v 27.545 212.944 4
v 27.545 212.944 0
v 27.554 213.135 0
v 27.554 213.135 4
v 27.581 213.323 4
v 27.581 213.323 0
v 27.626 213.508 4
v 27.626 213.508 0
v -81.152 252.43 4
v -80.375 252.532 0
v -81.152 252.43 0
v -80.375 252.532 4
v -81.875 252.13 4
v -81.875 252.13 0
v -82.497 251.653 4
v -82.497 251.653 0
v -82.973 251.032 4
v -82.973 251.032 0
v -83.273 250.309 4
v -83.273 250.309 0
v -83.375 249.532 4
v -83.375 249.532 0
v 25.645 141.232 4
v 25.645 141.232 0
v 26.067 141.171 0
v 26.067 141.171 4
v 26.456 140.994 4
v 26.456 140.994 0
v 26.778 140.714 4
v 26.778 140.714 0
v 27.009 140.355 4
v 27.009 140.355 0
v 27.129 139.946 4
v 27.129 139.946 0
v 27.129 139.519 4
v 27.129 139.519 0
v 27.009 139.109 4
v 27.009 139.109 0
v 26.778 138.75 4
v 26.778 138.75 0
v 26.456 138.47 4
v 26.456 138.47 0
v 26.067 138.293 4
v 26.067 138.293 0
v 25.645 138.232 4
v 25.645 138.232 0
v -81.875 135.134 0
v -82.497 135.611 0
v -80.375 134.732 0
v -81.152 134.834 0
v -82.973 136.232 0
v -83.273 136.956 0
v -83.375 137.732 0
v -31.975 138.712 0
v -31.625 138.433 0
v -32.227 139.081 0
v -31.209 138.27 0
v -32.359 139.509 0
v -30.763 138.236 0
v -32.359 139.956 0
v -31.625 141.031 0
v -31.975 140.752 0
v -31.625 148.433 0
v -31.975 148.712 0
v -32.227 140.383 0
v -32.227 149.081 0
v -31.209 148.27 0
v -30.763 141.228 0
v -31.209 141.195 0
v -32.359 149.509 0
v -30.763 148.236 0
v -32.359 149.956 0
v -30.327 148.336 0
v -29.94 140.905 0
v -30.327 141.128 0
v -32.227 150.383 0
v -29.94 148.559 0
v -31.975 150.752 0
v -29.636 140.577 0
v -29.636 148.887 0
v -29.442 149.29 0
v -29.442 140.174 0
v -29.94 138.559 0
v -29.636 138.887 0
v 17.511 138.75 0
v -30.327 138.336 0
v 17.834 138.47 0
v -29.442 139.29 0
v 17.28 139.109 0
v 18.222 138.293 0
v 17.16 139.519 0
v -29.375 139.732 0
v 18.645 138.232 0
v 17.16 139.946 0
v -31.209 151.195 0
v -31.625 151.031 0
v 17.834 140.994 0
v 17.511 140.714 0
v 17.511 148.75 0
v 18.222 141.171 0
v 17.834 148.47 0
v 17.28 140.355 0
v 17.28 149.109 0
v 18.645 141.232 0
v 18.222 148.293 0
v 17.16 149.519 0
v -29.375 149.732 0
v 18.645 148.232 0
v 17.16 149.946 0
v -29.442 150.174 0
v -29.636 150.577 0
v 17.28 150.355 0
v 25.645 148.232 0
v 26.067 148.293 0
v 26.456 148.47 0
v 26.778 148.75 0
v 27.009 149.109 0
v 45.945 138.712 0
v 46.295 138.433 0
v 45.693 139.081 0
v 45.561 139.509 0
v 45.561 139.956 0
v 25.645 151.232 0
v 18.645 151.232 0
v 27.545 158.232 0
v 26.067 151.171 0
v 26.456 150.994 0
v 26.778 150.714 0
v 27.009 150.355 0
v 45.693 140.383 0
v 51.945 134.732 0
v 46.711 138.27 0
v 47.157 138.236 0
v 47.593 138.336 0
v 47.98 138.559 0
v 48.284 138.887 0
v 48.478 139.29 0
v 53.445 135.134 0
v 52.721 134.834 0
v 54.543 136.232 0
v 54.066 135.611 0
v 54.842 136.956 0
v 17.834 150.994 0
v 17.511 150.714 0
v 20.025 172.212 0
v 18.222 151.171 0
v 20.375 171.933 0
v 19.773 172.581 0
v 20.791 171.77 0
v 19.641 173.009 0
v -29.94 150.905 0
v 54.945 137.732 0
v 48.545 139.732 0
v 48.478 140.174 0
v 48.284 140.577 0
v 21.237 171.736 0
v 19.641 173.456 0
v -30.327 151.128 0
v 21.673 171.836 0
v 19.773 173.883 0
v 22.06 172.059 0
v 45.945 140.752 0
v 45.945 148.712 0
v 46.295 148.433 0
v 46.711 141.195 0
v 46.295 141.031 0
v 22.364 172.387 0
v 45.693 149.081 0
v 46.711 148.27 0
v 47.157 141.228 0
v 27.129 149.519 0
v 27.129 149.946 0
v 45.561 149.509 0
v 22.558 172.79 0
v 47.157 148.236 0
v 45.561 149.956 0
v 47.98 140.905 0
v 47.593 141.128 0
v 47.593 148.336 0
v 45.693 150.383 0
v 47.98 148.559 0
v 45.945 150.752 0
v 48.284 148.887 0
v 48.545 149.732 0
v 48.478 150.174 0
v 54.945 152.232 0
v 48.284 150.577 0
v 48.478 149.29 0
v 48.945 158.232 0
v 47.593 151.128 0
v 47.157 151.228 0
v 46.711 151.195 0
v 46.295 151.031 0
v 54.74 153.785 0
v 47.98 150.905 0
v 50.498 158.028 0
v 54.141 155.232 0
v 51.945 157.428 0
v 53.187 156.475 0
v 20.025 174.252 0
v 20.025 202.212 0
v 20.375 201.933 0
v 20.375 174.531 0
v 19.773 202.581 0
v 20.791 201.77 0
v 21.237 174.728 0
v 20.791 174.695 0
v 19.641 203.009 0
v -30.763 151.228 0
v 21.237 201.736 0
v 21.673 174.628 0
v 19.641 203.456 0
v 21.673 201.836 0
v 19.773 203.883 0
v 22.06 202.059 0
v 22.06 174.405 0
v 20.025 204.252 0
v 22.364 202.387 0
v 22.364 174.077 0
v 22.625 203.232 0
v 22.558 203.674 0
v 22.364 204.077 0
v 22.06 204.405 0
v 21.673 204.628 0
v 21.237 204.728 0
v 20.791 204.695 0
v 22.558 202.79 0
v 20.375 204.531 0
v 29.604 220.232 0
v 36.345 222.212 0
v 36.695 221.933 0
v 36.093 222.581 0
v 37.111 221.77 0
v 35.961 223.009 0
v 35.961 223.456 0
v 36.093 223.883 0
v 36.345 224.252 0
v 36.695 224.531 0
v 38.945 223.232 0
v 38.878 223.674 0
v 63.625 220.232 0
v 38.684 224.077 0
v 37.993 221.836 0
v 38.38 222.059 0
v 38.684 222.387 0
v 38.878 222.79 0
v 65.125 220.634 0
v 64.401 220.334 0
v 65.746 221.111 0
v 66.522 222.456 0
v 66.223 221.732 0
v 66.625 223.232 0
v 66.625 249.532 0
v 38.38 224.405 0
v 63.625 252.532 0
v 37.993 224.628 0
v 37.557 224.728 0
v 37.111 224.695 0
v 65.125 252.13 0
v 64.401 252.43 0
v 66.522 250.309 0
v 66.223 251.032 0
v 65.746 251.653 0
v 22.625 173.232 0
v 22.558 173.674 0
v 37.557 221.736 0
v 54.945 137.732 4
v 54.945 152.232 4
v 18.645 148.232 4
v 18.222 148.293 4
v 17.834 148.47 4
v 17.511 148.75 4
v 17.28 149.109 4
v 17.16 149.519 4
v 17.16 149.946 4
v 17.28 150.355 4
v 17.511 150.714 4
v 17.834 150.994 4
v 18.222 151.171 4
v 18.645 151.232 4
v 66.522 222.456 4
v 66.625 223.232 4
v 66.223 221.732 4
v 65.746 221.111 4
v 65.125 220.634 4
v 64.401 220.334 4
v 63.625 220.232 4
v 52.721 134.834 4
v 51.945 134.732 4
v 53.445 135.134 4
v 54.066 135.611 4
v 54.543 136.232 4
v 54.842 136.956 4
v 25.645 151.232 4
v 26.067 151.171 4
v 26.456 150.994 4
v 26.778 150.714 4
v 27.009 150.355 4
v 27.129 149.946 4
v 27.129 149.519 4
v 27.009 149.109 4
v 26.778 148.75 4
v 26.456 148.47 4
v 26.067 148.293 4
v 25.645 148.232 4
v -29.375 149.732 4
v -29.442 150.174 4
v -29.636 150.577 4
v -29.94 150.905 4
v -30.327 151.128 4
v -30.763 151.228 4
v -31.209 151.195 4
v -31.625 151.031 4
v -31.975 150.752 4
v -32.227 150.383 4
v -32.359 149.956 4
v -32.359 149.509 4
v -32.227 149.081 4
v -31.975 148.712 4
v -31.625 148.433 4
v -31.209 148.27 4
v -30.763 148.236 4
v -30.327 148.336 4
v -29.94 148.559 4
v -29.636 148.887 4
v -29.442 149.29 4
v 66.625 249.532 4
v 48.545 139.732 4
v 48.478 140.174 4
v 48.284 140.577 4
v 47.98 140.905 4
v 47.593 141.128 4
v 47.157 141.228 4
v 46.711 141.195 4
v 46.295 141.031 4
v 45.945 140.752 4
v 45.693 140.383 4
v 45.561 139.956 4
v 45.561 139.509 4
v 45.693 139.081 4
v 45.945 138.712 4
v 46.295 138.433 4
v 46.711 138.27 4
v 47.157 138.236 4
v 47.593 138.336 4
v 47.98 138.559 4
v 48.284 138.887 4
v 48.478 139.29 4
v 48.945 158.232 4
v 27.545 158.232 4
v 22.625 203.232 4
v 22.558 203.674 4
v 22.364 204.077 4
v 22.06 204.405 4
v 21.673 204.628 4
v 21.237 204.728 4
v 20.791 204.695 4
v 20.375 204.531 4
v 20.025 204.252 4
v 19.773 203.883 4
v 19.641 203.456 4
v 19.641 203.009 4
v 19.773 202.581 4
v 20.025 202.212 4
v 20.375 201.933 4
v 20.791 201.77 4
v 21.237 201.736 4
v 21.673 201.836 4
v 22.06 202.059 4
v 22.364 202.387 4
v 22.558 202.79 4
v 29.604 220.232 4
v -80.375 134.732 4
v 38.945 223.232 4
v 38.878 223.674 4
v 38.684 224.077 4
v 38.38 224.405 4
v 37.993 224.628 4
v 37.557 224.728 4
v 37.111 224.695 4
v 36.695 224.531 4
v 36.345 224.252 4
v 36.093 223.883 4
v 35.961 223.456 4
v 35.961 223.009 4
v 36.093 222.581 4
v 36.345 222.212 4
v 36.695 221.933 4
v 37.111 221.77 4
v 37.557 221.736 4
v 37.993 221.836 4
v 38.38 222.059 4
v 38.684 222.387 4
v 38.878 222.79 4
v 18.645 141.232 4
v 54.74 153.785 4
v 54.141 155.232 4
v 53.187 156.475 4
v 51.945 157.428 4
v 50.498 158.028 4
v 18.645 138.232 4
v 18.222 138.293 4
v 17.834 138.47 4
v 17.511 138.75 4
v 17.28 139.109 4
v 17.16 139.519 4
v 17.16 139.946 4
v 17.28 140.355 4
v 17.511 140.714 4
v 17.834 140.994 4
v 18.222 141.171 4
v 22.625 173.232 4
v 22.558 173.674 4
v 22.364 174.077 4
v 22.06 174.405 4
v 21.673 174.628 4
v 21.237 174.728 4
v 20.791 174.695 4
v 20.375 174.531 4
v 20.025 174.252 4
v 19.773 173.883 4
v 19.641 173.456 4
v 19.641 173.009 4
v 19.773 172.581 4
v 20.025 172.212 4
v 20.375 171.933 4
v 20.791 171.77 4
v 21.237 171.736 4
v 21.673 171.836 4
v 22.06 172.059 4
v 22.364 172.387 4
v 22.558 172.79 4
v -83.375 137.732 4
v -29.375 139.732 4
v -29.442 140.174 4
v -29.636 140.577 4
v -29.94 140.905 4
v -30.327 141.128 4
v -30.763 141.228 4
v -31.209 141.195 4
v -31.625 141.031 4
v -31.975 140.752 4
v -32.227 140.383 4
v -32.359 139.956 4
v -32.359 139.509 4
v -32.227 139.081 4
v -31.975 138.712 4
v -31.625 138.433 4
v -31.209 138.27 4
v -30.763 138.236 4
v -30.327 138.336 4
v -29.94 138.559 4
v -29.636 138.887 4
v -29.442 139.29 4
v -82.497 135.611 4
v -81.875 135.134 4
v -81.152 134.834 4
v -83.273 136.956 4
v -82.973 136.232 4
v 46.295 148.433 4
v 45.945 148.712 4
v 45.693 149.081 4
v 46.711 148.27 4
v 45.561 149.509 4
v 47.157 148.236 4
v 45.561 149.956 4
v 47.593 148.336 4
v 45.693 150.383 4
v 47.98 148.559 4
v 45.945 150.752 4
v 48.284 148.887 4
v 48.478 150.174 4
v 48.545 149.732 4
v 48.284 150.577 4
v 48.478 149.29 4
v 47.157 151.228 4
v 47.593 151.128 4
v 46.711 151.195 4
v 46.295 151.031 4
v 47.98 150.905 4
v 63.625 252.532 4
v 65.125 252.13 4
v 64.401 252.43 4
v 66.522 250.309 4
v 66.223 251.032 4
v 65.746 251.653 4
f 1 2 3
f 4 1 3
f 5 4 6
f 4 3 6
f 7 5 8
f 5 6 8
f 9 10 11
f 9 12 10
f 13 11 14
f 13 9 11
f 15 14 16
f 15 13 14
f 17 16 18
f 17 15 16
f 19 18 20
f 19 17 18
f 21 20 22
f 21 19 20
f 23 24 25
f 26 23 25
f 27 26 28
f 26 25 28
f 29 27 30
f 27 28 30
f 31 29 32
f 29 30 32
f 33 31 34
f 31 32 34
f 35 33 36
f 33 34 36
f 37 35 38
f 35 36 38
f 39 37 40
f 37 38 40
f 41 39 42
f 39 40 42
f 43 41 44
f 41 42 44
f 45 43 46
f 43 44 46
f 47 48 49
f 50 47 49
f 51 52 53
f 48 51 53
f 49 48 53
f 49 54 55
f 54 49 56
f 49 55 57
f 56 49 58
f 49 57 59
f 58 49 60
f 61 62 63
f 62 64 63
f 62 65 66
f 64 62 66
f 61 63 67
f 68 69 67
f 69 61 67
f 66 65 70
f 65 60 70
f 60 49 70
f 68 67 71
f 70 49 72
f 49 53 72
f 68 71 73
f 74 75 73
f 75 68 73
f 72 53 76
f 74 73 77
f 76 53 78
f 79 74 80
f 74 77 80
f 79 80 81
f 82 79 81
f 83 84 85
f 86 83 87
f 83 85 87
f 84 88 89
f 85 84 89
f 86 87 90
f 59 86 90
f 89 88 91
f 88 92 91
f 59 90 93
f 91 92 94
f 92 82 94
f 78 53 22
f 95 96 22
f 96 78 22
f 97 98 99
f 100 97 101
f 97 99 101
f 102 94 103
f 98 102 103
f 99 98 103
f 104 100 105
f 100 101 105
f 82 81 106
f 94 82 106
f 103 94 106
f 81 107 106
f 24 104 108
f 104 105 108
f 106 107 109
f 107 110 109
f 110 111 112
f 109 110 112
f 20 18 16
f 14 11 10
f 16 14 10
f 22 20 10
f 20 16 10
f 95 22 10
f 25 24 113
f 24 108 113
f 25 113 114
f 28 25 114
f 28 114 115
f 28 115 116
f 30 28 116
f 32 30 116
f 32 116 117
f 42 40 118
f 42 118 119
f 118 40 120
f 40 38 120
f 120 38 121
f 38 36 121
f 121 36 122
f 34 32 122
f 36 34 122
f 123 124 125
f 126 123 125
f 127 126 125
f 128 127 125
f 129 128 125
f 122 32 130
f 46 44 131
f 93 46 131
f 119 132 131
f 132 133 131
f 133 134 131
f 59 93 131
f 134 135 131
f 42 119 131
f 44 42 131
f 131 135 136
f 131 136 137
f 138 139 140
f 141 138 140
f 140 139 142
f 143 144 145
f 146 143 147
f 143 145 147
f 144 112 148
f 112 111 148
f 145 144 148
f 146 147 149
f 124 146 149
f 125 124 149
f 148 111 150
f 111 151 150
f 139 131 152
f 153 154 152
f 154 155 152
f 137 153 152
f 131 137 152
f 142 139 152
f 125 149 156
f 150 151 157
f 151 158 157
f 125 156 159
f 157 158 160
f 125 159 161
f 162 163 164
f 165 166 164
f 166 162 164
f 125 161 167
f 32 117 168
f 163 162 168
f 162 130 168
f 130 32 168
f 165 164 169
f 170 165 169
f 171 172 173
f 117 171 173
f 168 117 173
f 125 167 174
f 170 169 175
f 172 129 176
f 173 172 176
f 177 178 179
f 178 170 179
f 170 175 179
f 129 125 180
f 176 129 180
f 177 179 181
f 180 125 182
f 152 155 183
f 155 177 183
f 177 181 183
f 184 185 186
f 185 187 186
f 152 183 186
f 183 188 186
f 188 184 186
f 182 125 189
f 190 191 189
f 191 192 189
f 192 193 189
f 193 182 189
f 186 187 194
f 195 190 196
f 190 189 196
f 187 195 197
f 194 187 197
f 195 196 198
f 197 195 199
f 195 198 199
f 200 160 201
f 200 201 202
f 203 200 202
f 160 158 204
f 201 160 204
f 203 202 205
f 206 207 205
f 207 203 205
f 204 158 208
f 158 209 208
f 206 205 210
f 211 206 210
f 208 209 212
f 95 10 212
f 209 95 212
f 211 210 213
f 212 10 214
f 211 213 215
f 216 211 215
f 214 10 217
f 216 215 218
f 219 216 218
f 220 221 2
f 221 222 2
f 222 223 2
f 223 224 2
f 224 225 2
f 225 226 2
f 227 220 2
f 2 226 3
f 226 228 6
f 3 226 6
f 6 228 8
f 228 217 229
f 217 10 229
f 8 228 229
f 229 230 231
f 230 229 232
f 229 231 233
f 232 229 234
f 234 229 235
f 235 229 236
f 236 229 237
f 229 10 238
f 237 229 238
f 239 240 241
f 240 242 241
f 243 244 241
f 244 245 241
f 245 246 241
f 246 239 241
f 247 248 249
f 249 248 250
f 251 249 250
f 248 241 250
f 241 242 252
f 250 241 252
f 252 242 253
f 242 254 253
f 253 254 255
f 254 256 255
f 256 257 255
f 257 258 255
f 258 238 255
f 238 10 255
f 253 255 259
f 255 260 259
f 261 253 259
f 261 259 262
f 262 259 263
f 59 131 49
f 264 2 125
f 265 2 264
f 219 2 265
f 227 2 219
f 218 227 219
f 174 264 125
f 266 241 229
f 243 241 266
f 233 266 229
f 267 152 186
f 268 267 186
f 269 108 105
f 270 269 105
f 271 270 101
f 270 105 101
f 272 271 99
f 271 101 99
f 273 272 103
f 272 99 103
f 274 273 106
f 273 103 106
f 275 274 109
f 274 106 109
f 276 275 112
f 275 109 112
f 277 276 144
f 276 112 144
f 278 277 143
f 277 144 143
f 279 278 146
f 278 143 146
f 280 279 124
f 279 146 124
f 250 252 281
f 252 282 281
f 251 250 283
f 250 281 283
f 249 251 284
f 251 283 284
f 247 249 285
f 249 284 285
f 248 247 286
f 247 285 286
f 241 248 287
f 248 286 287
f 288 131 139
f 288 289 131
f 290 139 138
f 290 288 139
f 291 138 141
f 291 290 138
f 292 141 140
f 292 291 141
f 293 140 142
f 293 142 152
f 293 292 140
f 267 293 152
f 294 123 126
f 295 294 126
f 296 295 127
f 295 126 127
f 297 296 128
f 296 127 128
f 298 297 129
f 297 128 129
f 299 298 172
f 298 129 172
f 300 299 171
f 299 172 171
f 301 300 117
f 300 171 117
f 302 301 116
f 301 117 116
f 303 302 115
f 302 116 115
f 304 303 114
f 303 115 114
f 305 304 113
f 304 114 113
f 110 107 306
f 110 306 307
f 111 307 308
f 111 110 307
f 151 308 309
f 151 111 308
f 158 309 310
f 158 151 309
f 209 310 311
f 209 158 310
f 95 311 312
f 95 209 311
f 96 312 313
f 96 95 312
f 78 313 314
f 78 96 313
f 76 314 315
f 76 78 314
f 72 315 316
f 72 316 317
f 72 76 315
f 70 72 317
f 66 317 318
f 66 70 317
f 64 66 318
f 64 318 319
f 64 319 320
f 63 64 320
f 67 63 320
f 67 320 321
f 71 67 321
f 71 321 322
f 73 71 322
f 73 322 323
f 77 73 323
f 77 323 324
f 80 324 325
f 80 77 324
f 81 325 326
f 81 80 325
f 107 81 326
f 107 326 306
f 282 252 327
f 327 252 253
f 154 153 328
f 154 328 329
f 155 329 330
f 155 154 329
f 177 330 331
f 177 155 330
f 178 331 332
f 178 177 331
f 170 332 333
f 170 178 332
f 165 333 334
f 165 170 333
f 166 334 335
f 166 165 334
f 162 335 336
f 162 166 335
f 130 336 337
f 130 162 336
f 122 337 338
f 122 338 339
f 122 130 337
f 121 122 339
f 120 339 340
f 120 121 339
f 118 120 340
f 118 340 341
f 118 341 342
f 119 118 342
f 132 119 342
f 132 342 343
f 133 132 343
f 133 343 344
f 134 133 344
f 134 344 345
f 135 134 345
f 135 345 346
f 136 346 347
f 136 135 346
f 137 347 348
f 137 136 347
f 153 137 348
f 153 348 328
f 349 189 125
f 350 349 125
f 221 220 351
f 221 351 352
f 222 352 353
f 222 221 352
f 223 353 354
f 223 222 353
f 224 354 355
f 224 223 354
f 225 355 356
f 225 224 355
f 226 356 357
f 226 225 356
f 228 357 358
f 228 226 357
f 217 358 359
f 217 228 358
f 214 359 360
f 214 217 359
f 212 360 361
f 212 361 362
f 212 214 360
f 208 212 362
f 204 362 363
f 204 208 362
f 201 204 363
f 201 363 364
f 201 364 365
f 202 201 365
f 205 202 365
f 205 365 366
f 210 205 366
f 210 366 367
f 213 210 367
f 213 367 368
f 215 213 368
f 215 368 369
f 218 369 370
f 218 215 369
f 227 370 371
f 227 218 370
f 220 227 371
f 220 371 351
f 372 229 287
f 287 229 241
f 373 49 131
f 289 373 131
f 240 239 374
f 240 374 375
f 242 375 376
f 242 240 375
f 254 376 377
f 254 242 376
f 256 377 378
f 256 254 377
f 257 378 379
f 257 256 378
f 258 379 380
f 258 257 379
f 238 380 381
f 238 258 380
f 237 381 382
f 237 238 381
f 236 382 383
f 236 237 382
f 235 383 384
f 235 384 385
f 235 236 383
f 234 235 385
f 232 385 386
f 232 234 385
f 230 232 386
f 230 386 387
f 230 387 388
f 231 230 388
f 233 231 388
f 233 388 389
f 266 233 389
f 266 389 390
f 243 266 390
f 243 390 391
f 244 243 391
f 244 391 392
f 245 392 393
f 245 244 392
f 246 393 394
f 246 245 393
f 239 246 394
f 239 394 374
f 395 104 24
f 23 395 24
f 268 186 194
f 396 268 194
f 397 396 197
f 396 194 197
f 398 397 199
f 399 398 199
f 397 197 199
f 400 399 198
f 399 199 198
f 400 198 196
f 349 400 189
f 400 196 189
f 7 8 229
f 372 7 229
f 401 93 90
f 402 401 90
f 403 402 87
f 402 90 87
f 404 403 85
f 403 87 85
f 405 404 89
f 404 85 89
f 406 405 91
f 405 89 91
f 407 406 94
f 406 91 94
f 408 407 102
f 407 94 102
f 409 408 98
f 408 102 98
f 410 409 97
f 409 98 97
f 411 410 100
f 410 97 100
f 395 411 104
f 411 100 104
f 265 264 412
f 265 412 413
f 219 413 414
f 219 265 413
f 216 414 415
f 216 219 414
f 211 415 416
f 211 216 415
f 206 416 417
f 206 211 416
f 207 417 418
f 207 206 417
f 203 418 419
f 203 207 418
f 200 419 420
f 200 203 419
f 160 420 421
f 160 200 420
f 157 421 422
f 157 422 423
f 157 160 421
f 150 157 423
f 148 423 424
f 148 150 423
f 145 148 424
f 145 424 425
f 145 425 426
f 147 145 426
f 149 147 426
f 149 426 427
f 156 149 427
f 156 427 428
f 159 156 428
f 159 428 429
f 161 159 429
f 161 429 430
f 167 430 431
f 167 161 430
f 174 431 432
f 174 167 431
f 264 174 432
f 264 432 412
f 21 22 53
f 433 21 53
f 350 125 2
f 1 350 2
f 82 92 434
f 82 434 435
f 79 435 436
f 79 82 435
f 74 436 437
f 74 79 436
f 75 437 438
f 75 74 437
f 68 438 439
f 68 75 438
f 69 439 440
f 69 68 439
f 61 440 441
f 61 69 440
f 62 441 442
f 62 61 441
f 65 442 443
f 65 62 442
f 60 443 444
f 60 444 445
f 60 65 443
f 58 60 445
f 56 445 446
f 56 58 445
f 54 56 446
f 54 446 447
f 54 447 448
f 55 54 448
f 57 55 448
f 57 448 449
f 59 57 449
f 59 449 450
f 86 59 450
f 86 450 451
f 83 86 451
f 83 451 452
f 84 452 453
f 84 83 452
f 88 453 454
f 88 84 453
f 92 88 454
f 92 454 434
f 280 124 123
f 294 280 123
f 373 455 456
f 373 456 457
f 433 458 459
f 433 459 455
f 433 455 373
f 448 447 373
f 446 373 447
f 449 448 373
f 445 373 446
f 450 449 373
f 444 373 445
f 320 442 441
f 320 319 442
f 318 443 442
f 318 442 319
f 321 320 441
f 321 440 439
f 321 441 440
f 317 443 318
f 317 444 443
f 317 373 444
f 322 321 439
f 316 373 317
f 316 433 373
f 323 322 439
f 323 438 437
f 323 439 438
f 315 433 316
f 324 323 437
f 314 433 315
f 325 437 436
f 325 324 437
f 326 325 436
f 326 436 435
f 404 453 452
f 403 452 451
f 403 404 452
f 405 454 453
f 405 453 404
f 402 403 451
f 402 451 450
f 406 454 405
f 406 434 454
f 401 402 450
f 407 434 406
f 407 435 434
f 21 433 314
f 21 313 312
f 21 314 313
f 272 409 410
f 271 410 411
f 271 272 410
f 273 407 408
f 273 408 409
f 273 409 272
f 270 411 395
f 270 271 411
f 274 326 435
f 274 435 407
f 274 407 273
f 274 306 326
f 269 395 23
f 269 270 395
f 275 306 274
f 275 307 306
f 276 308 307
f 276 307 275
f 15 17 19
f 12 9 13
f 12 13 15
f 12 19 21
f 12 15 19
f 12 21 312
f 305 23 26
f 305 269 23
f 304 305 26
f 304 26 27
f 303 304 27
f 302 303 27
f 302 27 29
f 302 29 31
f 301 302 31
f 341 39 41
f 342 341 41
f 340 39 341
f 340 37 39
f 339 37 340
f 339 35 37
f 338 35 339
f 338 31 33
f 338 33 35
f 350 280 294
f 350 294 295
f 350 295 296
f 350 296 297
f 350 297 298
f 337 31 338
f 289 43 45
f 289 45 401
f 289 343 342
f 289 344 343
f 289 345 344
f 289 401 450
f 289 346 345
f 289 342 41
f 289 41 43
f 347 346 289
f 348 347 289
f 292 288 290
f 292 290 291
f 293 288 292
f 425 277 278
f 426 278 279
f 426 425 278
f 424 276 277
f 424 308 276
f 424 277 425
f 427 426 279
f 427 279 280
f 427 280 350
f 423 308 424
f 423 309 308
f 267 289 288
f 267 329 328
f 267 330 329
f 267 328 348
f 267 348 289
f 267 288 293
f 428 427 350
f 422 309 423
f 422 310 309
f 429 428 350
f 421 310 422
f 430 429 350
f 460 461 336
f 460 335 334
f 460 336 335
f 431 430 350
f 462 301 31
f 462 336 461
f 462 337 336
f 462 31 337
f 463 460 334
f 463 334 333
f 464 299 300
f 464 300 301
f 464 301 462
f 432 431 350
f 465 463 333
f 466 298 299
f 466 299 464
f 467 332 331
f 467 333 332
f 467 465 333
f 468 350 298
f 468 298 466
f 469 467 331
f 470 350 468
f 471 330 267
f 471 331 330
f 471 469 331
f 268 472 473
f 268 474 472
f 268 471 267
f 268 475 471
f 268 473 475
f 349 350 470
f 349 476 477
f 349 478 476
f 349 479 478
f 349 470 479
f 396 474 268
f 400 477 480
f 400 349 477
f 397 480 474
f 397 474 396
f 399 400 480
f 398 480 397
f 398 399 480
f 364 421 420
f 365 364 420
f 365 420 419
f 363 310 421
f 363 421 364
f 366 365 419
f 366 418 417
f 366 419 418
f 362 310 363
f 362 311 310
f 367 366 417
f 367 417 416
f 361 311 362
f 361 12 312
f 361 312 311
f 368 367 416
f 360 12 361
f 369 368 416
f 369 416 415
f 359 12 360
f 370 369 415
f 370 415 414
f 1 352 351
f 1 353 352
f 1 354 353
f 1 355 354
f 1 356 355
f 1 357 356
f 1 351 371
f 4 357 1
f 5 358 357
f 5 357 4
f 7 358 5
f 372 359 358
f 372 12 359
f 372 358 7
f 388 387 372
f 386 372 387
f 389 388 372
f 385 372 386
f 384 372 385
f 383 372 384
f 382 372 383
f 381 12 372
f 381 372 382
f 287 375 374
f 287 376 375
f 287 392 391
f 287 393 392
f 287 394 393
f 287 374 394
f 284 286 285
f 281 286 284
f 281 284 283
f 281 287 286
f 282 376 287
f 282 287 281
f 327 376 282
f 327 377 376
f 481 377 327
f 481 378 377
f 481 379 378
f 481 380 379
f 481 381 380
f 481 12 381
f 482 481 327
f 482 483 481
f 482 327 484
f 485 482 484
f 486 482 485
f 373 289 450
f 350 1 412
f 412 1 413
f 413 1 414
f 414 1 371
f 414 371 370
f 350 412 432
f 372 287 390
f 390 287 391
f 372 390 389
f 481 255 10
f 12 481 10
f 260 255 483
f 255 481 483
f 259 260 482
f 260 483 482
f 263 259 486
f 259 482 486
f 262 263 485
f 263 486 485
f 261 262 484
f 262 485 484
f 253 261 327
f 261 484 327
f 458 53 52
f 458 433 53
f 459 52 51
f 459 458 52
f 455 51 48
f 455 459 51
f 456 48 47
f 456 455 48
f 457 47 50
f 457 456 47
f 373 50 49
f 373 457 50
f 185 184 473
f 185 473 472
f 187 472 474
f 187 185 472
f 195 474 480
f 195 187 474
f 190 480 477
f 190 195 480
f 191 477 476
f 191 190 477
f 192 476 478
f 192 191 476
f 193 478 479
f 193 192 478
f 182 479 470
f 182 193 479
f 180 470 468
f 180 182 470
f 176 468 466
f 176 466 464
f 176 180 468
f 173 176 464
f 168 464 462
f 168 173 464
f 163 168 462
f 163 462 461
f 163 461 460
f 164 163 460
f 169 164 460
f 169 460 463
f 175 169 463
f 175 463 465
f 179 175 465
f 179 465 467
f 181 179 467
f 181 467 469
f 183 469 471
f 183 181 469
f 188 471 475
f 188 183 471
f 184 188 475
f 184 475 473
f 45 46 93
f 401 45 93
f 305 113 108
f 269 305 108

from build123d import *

# Parameters (mm, degrees)
SKETCH_2_R      = 1.5
EXTRUDE_3_DEPTH = 4
FILLET_2_R      = 3


with BuildPart() as part:
    # 草图2 → 凸台-拉伸3 (new body)
    with BuildSketch(Plane.XY):
        with BuildLine():
            Line((66.624685503, 252.532138716), (-83.375314497, 252.532138716))
            Line((-83.375314497, 252.532138716), (-83.375314497, 134.732138716))
            Line((-83.375314497, 134.732138716), (54.944685503, 134.732138716))
            Line((54.944685503, 134.732138716), (54.944685503, 152.232138716))
            ThreePointArc((54.944685503, 152.232138716), (53.18732619, 156.474779403), (48.944685503, 158.232138716))
            Line((48.944685503, 158.232138716), (27.544685503, 158.232138716))
            Line((27.544685503, 158.232138716), (27.544685503, 212.944120657))
            ThreePointArc((27.544685503, 212.944120657), (27.565107012, 213.229197834), (27.6259545, 213.508453305))
            Line((27.6259545, 213.508453305), (29.603509033, 220.232138716))
            Line((29.603509033, 220.232138716), (66.624685503, 220.232138716))
            Line((66.624685503, 220.232138716), (66.624685503, 252.532138716))
        make_face()
        with Locations((-30.875314497, 139.732138716)):
            Circle(SKETCH_2_R, mode=Mode.SUBTRACT)
        with Locations((-30.875314497, 149.732138716)):
            Circle(SKETCH_2_R, mode=Mode.SUBTRACT)
        with Locations((21.124685503, 173.232138716)):
            Circle(SKETCH_2_R, mode=Mode.SUBTRACT)
        with Locations((21.124685503, 203.232138716)):
            Circle(SKETCH_2_R, mode=Mode.SUBTRACT)
        with BuildLine():
            Line((18.644685503, 151.232138716), (25.644685503, 151.232138716))
            ThreePointArc((25.644685503, 151.232138716), (27.144685503, 149.732138716), (25.644685503, 148.232138716))
            Line((25.644685503, 148.232138716), (18.644685503, 148.232138716))
            ThreePointArc((18.644685503, 148.232138716), (17.144685503, 149.732138716), (18.644685503, 151.232138716))
        make_face(mode=Mode.SUBTRACT)
        with BuildLine():
            Line((25.644685503, 138.232138716), (18.644685503, 138.232138716))
            ThreePointArc((18.644685503, 138.232138716), (17.144685503, 139.732138716), (18.644685503, 141.232138716))
            Line((18.644685503, 141.232138716), (25.644685503, 141.232138716))
            ThreePointArc((25.644685503, 141.232138716), (27.144685503, 139.732138716), (25.644685503, 138.232138716))
        make_face(mode=Mode.SUBTRACT)
        with Locations((37.444685503, 223.232138716)):
            Circle(SKETCH_2_R, mode=Mode.SUBTRACT)
        with Locations((47.044685503, 149.732138716)):
            Circle(SKETCH_2_R, mode=Mode.SUBTRACT)
        with Locations((47.044685503, 139.732138716)):
            Circle(SKETCH_2_R, mode=Mode.SUBTRACT)
    extrude(amount=EXTRUDE_3_DEPTH)

    # 圆角2
    fillet_2_edges = [part.edges().sort_by_distance(p)[0] for p in [
        (-83.375314497, 134.732138716, 2),
        (-83.375314497, 252.532138716, 2),
        (66.624685503, 252.532138716, 2),
        (66.624685503, 220.232138716, 2),
        (54.944685503, 134.732138716, 2),
    ]]
    fillet(fillet_2_edges, radius=FILLET_2_R)


solid = part.part
